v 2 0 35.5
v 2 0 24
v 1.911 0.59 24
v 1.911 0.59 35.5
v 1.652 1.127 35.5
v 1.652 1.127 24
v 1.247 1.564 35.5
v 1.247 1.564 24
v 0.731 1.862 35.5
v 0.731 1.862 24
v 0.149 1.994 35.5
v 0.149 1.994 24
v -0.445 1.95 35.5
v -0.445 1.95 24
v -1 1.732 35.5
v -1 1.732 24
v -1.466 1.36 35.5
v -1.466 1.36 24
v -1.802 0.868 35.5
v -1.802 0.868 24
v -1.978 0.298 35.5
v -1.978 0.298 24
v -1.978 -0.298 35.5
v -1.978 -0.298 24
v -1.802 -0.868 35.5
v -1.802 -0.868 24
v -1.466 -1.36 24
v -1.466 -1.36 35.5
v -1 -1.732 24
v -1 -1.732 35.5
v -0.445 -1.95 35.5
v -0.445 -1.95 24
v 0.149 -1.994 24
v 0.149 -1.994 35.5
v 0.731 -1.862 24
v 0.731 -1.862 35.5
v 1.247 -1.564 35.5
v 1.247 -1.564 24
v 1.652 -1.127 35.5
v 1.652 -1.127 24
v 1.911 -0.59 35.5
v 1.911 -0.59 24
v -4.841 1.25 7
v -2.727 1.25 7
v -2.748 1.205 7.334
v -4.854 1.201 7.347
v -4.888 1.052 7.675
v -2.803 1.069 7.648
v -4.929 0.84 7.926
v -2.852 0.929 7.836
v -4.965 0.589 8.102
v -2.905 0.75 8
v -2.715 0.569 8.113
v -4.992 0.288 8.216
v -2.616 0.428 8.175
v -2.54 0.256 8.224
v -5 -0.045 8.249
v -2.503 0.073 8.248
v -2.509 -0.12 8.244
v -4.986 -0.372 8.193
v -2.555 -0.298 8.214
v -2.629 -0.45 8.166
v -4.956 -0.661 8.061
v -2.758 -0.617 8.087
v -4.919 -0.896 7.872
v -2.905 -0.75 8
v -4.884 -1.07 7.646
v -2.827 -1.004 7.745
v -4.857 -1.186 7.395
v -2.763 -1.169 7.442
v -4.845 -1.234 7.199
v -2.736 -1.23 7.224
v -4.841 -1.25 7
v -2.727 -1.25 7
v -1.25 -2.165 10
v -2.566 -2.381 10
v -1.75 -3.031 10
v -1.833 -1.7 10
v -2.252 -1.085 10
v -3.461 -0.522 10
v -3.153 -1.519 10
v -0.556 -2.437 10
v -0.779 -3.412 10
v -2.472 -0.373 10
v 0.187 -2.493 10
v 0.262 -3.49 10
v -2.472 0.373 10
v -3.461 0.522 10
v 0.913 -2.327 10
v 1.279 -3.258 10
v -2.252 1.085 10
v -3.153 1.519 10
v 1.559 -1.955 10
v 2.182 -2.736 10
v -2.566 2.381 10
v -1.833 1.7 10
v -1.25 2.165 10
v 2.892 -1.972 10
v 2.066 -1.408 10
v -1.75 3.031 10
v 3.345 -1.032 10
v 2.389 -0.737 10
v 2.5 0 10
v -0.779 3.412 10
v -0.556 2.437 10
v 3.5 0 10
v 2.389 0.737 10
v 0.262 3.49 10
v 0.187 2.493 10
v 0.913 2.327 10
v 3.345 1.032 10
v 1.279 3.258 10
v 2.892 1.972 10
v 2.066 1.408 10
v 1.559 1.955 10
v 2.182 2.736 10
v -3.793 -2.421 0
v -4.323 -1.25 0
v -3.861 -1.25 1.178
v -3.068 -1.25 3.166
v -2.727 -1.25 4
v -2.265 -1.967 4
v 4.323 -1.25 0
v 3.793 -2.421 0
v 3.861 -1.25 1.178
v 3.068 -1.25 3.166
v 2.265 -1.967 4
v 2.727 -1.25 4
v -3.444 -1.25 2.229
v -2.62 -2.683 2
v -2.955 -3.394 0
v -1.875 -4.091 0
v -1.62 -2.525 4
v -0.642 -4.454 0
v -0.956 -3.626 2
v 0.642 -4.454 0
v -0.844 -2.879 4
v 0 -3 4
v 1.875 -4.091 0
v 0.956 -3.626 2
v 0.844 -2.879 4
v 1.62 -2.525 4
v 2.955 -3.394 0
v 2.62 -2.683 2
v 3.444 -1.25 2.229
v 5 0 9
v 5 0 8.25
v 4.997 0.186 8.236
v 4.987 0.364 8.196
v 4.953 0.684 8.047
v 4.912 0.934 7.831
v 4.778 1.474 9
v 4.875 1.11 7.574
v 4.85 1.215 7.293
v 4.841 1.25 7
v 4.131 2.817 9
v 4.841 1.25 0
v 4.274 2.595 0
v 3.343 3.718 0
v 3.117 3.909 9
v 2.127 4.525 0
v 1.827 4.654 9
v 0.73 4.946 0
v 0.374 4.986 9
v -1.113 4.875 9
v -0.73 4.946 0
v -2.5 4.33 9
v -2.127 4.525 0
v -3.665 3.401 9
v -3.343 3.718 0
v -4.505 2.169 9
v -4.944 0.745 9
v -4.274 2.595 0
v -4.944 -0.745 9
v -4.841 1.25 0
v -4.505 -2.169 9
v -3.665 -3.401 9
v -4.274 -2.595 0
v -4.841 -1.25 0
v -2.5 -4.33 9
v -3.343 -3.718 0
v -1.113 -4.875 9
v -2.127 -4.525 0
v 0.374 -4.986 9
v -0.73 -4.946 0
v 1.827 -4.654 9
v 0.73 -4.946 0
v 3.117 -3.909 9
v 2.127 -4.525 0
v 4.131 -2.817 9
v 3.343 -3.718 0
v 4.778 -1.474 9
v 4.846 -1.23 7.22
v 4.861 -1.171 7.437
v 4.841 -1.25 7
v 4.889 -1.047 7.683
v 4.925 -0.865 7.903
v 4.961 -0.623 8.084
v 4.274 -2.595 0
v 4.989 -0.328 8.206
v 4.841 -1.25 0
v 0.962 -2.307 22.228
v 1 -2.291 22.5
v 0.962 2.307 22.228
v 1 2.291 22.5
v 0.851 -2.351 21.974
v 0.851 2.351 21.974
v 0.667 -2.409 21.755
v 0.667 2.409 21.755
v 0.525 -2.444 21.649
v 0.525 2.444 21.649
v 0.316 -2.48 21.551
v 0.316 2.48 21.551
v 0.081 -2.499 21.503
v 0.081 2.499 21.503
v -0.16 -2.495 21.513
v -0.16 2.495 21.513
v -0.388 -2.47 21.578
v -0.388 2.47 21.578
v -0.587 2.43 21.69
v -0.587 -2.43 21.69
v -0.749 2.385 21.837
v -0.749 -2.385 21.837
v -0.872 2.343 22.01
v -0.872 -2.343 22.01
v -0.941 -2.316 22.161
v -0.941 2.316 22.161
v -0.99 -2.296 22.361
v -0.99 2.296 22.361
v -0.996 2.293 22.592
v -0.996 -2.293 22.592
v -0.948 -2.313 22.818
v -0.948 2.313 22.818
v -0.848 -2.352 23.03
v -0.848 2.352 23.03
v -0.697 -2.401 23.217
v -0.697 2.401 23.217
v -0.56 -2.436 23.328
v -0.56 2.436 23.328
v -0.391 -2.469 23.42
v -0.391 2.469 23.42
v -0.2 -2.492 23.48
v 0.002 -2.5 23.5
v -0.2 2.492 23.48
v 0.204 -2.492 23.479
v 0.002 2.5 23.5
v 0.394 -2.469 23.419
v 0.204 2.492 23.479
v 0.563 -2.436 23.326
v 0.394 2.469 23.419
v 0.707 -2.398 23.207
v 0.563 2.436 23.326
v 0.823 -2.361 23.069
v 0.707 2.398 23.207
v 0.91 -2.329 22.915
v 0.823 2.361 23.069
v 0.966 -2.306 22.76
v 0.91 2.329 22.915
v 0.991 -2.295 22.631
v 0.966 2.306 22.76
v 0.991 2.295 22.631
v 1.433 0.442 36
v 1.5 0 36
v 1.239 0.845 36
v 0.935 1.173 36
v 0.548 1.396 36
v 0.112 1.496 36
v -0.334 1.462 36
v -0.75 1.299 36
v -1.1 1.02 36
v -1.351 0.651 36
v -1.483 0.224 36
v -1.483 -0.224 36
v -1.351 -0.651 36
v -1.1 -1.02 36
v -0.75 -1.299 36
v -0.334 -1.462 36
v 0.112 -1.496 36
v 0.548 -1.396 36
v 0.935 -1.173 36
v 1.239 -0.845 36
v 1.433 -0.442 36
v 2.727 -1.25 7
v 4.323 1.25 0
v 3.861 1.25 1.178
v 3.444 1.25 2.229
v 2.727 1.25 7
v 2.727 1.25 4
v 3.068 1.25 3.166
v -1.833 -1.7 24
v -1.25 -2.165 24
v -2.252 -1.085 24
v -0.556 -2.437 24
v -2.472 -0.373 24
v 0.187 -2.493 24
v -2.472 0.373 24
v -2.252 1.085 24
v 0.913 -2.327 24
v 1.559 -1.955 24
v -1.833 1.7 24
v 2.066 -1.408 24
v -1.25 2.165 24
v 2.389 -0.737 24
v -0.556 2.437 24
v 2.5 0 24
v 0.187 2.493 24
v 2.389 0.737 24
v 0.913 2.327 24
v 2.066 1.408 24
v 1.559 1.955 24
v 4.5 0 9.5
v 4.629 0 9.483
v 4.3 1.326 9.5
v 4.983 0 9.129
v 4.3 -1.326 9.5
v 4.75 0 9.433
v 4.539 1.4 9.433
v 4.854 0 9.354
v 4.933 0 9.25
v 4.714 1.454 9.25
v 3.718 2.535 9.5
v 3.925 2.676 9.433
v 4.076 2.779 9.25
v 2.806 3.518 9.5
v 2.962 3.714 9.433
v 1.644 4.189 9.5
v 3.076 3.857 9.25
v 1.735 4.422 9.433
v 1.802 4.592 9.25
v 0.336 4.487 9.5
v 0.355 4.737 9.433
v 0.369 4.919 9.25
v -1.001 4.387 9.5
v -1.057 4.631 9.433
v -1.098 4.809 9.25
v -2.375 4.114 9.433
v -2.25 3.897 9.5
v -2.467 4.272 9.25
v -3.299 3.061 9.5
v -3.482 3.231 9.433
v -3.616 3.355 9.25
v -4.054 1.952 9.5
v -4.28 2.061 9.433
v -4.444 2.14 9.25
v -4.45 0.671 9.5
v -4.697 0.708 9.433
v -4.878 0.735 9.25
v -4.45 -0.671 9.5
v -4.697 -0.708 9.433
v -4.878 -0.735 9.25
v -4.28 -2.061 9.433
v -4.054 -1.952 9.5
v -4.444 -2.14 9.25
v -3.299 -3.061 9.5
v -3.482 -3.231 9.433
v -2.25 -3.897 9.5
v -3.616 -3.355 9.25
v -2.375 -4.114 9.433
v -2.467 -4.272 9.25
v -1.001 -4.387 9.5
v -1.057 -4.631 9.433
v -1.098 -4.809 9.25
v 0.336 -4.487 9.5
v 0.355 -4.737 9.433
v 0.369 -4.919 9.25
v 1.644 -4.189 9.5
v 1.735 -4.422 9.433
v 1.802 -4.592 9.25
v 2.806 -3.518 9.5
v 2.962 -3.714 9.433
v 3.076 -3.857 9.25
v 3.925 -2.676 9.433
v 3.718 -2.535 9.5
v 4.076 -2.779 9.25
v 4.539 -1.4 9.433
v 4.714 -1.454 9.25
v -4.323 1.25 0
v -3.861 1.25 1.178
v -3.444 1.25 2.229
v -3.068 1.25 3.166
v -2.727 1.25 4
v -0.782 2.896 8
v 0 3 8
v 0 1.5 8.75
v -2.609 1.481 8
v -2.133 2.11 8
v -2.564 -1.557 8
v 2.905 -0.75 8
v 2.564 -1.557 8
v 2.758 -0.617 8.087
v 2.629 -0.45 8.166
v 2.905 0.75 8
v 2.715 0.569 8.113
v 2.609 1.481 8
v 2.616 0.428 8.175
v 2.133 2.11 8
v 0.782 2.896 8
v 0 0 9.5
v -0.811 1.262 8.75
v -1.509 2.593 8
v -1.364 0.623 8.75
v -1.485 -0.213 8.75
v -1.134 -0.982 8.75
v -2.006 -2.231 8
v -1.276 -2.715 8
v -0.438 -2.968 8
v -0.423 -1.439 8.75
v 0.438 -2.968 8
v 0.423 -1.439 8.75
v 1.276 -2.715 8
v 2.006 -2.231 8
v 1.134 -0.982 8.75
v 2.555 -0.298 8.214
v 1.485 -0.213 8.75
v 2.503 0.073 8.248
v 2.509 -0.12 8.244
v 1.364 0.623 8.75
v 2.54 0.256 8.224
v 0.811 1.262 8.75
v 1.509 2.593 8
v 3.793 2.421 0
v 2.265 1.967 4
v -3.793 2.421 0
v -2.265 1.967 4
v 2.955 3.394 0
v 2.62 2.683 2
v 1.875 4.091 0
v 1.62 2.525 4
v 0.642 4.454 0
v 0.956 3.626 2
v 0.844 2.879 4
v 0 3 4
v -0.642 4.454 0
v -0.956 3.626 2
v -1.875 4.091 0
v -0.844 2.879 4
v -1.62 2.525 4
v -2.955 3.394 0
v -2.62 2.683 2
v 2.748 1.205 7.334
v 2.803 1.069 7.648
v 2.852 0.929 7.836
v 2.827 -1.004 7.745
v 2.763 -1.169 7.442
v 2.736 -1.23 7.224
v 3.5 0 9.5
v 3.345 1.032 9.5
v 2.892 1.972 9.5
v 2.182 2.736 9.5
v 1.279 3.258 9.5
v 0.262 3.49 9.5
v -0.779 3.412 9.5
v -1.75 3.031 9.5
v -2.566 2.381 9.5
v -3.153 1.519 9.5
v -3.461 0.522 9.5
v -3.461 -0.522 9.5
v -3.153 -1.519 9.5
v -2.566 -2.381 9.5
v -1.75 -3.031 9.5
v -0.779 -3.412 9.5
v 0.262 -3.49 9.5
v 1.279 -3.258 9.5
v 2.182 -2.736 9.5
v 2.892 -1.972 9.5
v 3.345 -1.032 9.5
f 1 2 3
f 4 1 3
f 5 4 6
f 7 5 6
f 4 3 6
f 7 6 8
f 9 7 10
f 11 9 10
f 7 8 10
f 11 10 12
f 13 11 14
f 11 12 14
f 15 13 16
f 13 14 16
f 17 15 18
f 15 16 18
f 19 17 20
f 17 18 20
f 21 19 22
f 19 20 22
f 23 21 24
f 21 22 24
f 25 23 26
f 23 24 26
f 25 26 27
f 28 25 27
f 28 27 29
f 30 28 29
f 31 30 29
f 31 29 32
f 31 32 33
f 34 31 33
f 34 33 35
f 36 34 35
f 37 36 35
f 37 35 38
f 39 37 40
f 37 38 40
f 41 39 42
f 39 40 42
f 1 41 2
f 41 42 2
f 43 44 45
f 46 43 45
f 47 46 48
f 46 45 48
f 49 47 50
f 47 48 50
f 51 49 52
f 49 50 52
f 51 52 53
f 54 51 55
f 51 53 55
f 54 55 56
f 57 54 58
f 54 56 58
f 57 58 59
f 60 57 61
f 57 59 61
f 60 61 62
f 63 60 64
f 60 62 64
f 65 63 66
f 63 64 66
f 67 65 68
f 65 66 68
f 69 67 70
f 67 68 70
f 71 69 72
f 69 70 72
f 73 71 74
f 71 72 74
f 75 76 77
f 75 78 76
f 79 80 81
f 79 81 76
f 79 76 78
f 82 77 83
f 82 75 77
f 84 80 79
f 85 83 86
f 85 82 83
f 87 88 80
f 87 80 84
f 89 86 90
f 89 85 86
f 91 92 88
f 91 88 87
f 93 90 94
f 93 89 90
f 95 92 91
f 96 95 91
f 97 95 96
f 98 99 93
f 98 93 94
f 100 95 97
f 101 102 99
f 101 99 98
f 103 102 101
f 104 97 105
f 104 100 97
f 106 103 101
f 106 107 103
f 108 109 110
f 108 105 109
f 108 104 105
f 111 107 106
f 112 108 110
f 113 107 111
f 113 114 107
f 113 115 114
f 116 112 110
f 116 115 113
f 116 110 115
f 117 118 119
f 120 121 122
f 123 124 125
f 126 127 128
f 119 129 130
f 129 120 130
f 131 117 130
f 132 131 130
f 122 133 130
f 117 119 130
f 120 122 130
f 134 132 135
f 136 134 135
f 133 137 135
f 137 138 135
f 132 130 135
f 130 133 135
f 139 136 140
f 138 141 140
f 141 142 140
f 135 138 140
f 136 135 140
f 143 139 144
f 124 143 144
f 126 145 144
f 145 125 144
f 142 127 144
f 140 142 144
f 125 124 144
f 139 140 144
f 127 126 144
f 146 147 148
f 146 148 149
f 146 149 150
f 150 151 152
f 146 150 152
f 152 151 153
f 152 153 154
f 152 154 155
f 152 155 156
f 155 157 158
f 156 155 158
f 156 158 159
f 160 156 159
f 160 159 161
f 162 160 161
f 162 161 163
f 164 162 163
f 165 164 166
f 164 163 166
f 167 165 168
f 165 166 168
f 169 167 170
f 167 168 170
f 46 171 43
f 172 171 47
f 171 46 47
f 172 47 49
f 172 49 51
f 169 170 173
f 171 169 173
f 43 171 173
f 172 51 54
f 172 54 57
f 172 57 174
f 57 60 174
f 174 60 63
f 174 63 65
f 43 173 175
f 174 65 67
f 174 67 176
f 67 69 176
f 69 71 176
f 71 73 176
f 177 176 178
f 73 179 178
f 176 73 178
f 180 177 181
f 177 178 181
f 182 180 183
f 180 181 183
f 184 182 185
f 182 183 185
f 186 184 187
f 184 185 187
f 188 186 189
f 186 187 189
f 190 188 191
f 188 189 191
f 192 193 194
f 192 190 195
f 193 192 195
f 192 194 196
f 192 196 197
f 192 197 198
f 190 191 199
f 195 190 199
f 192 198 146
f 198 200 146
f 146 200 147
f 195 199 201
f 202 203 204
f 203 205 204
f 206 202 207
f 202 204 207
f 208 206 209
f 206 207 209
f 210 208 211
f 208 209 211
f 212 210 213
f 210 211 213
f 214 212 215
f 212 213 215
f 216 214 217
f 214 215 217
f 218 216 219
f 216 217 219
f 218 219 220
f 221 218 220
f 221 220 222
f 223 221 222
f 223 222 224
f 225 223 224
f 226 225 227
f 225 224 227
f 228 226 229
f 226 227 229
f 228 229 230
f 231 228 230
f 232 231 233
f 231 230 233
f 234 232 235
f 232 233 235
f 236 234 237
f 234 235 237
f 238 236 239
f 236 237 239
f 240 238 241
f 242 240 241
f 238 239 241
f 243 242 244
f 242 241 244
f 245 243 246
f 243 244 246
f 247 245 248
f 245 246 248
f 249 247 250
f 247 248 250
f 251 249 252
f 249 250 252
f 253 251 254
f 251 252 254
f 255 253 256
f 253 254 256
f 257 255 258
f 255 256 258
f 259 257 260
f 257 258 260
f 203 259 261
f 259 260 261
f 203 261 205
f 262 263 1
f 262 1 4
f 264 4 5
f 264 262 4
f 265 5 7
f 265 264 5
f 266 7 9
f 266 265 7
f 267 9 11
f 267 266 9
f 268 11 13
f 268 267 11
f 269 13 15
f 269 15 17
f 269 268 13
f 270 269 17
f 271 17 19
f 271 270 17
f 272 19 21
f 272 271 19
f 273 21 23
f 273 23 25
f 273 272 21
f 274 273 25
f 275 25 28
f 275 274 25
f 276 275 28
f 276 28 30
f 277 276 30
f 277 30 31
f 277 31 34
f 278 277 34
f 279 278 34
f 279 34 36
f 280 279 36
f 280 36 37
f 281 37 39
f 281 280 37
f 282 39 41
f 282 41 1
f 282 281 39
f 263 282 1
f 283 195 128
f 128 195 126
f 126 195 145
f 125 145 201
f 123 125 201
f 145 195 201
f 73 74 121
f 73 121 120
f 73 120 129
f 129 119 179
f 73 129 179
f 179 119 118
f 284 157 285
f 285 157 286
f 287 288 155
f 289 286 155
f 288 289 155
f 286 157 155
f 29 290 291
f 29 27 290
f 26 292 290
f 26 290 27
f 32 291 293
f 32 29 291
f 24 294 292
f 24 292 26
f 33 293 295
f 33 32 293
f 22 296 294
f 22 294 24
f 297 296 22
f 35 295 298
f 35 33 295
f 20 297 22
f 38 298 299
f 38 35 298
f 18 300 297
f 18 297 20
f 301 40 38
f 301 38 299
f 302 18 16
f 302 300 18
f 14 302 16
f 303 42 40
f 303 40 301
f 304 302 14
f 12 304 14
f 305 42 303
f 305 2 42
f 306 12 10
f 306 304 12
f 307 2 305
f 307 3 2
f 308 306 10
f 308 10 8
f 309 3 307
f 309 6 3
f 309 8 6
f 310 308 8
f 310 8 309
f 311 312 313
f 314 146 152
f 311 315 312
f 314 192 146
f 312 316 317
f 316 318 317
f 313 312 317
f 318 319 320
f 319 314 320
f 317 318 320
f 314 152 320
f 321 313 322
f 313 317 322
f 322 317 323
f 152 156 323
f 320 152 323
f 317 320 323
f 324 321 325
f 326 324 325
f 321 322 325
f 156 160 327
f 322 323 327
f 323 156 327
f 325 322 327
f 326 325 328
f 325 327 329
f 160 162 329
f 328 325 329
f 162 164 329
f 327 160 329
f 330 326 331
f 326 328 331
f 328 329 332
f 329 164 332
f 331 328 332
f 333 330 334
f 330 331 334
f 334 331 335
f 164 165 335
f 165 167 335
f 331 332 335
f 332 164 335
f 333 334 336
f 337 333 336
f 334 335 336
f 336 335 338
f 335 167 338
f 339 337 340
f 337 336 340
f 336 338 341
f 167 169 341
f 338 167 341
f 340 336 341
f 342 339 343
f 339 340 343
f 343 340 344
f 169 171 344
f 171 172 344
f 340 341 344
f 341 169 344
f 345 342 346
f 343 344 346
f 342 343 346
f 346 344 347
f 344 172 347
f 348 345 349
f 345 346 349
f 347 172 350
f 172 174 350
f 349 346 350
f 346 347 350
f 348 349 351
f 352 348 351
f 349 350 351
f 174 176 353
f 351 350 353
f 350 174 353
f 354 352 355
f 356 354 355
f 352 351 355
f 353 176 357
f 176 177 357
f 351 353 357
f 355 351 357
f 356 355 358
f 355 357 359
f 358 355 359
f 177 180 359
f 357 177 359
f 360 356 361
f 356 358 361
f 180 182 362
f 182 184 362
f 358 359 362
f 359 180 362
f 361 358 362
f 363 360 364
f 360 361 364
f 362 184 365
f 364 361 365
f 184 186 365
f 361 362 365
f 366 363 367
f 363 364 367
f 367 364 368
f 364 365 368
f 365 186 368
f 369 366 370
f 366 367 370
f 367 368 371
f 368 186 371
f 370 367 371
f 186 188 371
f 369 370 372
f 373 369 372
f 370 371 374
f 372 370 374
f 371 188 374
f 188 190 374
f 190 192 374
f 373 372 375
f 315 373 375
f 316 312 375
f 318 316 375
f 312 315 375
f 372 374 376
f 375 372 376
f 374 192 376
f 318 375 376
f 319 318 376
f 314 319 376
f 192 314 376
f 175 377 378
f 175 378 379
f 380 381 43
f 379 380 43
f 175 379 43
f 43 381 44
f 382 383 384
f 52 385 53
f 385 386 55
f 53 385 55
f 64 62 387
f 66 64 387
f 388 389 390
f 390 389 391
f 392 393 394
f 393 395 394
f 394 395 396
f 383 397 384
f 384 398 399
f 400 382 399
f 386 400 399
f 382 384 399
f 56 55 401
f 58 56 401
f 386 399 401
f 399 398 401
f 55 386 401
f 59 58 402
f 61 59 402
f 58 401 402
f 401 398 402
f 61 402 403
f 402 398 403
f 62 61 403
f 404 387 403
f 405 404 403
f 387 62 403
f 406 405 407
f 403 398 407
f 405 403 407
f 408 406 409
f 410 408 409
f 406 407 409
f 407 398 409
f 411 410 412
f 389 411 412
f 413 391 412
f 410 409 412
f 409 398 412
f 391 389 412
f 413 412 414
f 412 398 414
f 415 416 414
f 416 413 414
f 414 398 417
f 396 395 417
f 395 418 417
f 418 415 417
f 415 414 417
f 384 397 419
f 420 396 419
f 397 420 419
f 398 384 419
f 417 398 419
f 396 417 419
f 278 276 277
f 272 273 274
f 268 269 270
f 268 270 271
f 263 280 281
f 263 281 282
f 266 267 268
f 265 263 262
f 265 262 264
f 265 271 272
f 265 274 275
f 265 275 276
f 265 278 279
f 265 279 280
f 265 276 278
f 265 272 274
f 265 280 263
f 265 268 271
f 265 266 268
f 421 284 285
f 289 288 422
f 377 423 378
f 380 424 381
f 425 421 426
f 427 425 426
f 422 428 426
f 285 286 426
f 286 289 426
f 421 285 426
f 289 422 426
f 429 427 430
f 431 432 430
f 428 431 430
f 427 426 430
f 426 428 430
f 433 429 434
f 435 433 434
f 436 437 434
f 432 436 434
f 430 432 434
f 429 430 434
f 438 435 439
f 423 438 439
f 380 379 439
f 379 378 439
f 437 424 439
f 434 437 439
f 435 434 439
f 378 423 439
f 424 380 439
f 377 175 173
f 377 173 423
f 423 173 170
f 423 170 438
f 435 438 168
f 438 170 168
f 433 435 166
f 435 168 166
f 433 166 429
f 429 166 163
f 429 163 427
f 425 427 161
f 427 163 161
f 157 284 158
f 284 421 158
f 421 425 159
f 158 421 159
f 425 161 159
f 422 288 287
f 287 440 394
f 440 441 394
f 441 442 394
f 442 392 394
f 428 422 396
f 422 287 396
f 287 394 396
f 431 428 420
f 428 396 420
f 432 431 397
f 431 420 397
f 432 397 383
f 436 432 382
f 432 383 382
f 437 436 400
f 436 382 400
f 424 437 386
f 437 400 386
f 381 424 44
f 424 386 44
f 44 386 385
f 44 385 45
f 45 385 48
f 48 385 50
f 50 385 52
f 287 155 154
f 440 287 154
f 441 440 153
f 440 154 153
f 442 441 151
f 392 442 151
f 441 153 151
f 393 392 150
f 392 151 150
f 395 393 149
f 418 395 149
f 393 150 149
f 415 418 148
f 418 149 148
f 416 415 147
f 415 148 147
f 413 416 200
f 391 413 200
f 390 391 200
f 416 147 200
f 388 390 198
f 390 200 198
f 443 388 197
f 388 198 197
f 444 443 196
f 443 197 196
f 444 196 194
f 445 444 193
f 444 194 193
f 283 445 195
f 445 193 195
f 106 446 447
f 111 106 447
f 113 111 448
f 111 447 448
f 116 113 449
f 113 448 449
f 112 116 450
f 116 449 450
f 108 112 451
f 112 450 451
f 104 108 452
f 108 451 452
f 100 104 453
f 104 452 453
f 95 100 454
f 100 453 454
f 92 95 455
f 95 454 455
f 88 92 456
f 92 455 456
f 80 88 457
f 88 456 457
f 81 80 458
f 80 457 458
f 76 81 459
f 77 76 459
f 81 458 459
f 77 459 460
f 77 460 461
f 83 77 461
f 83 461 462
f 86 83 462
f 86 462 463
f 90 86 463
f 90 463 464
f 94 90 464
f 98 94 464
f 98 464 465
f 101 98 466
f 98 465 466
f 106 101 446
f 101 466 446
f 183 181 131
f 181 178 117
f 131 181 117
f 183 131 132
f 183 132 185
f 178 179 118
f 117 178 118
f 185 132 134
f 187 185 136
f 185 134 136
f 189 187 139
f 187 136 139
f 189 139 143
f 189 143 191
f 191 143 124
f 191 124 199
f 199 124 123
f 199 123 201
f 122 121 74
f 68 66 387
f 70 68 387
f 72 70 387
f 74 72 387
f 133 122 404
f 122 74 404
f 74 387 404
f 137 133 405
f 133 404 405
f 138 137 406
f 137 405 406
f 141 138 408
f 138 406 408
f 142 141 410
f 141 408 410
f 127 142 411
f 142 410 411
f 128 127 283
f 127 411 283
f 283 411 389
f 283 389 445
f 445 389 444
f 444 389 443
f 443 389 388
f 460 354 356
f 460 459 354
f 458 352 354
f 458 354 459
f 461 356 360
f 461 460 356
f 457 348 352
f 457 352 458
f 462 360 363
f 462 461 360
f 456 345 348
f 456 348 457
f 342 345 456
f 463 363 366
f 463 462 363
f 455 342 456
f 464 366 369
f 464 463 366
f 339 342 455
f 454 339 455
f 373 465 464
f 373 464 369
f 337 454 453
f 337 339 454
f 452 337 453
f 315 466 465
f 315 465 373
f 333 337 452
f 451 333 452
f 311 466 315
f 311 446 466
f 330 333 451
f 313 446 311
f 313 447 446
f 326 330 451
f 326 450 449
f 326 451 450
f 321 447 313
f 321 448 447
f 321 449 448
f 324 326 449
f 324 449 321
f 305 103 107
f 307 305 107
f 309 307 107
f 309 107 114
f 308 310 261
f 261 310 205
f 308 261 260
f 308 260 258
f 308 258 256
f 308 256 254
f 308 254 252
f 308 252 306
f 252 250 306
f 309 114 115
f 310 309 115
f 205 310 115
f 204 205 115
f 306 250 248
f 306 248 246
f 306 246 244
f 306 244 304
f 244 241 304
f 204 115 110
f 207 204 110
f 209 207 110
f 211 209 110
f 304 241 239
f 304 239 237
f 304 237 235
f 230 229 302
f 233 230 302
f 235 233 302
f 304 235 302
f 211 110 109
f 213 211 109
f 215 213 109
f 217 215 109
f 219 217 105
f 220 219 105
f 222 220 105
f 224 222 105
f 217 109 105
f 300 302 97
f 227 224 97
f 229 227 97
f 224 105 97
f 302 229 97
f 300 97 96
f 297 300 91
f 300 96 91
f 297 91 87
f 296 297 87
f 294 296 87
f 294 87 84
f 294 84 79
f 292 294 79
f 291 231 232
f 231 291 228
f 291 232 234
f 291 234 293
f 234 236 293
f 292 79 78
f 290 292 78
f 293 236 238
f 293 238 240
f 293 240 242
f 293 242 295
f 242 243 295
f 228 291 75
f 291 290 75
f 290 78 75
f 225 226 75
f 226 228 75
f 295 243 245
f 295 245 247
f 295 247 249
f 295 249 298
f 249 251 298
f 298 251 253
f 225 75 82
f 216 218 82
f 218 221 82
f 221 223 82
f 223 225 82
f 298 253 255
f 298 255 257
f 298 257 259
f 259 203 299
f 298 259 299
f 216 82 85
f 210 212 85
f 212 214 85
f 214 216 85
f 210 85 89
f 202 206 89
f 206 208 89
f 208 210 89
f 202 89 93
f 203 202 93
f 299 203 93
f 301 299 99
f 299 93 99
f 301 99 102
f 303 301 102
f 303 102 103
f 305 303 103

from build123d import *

# Parameters (mm, degrees)
ESQUISSE1_R             = 5
BASE_EXTRUSION_DEPTH    = 9.5
ESQUISSE2_R             = 3.5
BOSS_EXTRU_1_DEPTH      = 0.5
ESQUISSE3_R             = 2.5
BOSS_EXTRU_2_DEPTH      = 14
ESQUISSE4_R             = 2
BOSS_EXTRU_3_DEPTH      = 12
CHANFREIN1_SIZE         = 0.5
CONG_1_R                = 0.5
ENL_V_MAT_EXTRU_1_DEPTH = 16
ESQUISSE9_R             = 1
ENL_V_MAT_EXTRU_2_DEPTH = 10


with BuildPart() as part:
    # Esquisse1 → Base-Extrusion (new body)
    with BuildSketch(Plane.XY):
        Circle(ESQUISSE1_R)
    extrude(amount=BASE_EXTRUSION_DEPTH)

    # Esquisse2 → Boss.-Extru.1 (add)
    with BuildSketch(Plane.XY.offset(9.5)):
        Circle(ESQUISSE2_R)
    extrude(amount=BOSS_EXTRU_1_DEPTH)

    # Esquisse3 → Boss.-Extru.2 (add)
    with BuildSketch(Plane.XY.offset(10)):
        Circle(ESQUISSE3_R)
    extrude(amount=BOSS_EXTRU_2_DEPTH)

    # Esquisse4 → Boss.-Extru.3 (add)
    with BuildSketch(Plane.XY.offset(24)):
        Circle(ESQUISSE4_R)
    extrude(amount=BOSS_EXTRU_3_DEPTH)

    # Chanfrein1
    chanfrein1_edges = [part.edges().sort_by_distance(p)[0] for p in [
        (-2, 0, 36),
    ]]
    chamfer(chanfrein1_edges, length=CHANFREIN1_SIZE)

    # Congé1
    cong_1_edges = [part.edges().sort_by_distance(p)[0] for p in [
        (-5, 0, 9.5),
    ]]
    fillet(cong_1_edges, radius=CONG_1_R)

    # Esquisse7 → Enlèv. mat.-Extru.1 (cut, symmetric)
    with BuildSketch(Plane(origin=(0, 0, 0), x_dir=(0, 0, -1), z_dir=(1, 0, 0))):
        with BuildLine():
            Line((1, 1.25), (-7, 1.25))
            ThreePointArc((-7, 1.25), (-8.25, 0), (-7, -1.25))
            Line((-7, -1.25), (1, -1.25))
            Line((1, -1.25), (1, 1.25))
        make_face()
    extrude(amount=ENL_V_MAT_EXTRU_1_DEPTH, both=True, mode=Mode.SUBTRACT)

    # Esquisse8 → Enlèvement de matière-Révolution1 (revolve, cut)
    with BuildSketch(Plane(origin=(0, 0, 0), x_dir=(0, 0, -1), z_dir=(1, 0, 0))):
        Polygon((0, 4.5), (-4, 3), (-8, 3), (-9.5, 0), (0, 0), align=None)
    revolve(axis=Axis((0, 0, 0), (0, 0, 1)), mode=Mode.SUBTRACT)

    # Esquisse9 → Enlèv. mat.-Extru.2 (cut, symmetric)
    with BuildSketch(Plane(origin=(0, 0, 0), x_dir=(1, 0, 0), z_dir=(0, 1, 0))):
        with Locations((0, -22.5)):
            Circle(ESQUISSE9_R)
    extrude(amount=ENL_V_MAT_EXTRU_2_DEPTH, both=True, mode=Mode.SUBTRACT)


solid = part.part
